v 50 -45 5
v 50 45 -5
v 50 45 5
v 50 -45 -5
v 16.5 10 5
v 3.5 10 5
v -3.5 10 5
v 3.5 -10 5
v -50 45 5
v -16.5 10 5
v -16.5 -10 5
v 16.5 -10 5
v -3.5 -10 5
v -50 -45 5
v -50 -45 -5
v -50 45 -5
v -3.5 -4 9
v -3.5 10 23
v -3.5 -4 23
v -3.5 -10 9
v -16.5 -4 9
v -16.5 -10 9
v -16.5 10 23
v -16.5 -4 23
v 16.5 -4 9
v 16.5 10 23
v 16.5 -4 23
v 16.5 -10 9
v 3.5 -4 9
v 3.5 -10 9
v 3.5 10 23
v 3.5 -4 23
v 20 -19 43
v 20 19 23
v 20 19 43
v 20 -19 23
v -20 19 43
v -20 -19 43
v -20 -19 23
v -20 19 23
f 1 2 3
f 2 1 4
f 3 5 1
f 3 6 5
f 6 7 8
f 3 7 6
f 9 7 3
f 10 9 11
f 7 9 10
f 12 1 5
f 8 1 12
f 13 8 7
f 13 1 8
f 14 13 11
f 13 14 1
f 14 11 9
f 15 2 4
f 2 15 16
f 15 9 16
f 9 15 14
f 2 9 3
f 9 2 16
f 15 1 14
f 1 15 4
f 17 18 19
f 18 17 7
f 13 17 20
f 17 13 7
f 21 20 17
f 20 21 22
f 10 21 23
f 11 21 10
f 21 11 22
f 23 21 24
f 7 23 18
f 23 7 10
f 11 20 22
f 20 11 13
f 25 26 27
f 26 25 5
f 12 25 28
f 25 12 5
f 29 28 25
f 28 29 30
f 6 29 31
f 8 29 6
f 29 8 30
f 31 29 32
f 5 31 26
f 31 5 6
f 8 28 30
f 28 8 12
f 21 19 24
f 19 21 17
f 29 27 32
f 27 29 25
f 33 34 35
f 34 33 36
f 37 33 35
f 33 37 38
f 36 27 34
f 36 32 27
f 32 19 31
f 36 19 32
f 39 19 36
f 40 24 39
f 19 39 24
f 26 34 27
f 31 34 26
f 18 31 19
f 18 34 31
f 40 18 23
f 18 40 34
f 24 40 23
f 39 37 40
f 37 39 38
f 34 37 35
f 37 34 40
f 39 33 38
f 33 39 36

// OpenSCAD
w=100;
h=10;
d=90;
dims=[w,d,h];

//creating the surface
translate([0,0,0]){
cube(dims, center=true);
}

//5
//creating feet
translate([-10,0,7]){
color([1,0,0]) cube([13,20,4], center=true);
}

translate([10,0,7]){
color([1,0,0]) cube([13,20,4], center=true);
}

//9
//creating legs
translate([-10,3,21]){
color([1,1,1]) cube([13,14,24], center=true);
}

translate([10,3,21]){
color([1,1,1]) cube([13,14,24], center=true);
}

//33
//creating body

translate([0,0,33]){
color([2,1,2]) cube([40,38,20], center=true);
}
